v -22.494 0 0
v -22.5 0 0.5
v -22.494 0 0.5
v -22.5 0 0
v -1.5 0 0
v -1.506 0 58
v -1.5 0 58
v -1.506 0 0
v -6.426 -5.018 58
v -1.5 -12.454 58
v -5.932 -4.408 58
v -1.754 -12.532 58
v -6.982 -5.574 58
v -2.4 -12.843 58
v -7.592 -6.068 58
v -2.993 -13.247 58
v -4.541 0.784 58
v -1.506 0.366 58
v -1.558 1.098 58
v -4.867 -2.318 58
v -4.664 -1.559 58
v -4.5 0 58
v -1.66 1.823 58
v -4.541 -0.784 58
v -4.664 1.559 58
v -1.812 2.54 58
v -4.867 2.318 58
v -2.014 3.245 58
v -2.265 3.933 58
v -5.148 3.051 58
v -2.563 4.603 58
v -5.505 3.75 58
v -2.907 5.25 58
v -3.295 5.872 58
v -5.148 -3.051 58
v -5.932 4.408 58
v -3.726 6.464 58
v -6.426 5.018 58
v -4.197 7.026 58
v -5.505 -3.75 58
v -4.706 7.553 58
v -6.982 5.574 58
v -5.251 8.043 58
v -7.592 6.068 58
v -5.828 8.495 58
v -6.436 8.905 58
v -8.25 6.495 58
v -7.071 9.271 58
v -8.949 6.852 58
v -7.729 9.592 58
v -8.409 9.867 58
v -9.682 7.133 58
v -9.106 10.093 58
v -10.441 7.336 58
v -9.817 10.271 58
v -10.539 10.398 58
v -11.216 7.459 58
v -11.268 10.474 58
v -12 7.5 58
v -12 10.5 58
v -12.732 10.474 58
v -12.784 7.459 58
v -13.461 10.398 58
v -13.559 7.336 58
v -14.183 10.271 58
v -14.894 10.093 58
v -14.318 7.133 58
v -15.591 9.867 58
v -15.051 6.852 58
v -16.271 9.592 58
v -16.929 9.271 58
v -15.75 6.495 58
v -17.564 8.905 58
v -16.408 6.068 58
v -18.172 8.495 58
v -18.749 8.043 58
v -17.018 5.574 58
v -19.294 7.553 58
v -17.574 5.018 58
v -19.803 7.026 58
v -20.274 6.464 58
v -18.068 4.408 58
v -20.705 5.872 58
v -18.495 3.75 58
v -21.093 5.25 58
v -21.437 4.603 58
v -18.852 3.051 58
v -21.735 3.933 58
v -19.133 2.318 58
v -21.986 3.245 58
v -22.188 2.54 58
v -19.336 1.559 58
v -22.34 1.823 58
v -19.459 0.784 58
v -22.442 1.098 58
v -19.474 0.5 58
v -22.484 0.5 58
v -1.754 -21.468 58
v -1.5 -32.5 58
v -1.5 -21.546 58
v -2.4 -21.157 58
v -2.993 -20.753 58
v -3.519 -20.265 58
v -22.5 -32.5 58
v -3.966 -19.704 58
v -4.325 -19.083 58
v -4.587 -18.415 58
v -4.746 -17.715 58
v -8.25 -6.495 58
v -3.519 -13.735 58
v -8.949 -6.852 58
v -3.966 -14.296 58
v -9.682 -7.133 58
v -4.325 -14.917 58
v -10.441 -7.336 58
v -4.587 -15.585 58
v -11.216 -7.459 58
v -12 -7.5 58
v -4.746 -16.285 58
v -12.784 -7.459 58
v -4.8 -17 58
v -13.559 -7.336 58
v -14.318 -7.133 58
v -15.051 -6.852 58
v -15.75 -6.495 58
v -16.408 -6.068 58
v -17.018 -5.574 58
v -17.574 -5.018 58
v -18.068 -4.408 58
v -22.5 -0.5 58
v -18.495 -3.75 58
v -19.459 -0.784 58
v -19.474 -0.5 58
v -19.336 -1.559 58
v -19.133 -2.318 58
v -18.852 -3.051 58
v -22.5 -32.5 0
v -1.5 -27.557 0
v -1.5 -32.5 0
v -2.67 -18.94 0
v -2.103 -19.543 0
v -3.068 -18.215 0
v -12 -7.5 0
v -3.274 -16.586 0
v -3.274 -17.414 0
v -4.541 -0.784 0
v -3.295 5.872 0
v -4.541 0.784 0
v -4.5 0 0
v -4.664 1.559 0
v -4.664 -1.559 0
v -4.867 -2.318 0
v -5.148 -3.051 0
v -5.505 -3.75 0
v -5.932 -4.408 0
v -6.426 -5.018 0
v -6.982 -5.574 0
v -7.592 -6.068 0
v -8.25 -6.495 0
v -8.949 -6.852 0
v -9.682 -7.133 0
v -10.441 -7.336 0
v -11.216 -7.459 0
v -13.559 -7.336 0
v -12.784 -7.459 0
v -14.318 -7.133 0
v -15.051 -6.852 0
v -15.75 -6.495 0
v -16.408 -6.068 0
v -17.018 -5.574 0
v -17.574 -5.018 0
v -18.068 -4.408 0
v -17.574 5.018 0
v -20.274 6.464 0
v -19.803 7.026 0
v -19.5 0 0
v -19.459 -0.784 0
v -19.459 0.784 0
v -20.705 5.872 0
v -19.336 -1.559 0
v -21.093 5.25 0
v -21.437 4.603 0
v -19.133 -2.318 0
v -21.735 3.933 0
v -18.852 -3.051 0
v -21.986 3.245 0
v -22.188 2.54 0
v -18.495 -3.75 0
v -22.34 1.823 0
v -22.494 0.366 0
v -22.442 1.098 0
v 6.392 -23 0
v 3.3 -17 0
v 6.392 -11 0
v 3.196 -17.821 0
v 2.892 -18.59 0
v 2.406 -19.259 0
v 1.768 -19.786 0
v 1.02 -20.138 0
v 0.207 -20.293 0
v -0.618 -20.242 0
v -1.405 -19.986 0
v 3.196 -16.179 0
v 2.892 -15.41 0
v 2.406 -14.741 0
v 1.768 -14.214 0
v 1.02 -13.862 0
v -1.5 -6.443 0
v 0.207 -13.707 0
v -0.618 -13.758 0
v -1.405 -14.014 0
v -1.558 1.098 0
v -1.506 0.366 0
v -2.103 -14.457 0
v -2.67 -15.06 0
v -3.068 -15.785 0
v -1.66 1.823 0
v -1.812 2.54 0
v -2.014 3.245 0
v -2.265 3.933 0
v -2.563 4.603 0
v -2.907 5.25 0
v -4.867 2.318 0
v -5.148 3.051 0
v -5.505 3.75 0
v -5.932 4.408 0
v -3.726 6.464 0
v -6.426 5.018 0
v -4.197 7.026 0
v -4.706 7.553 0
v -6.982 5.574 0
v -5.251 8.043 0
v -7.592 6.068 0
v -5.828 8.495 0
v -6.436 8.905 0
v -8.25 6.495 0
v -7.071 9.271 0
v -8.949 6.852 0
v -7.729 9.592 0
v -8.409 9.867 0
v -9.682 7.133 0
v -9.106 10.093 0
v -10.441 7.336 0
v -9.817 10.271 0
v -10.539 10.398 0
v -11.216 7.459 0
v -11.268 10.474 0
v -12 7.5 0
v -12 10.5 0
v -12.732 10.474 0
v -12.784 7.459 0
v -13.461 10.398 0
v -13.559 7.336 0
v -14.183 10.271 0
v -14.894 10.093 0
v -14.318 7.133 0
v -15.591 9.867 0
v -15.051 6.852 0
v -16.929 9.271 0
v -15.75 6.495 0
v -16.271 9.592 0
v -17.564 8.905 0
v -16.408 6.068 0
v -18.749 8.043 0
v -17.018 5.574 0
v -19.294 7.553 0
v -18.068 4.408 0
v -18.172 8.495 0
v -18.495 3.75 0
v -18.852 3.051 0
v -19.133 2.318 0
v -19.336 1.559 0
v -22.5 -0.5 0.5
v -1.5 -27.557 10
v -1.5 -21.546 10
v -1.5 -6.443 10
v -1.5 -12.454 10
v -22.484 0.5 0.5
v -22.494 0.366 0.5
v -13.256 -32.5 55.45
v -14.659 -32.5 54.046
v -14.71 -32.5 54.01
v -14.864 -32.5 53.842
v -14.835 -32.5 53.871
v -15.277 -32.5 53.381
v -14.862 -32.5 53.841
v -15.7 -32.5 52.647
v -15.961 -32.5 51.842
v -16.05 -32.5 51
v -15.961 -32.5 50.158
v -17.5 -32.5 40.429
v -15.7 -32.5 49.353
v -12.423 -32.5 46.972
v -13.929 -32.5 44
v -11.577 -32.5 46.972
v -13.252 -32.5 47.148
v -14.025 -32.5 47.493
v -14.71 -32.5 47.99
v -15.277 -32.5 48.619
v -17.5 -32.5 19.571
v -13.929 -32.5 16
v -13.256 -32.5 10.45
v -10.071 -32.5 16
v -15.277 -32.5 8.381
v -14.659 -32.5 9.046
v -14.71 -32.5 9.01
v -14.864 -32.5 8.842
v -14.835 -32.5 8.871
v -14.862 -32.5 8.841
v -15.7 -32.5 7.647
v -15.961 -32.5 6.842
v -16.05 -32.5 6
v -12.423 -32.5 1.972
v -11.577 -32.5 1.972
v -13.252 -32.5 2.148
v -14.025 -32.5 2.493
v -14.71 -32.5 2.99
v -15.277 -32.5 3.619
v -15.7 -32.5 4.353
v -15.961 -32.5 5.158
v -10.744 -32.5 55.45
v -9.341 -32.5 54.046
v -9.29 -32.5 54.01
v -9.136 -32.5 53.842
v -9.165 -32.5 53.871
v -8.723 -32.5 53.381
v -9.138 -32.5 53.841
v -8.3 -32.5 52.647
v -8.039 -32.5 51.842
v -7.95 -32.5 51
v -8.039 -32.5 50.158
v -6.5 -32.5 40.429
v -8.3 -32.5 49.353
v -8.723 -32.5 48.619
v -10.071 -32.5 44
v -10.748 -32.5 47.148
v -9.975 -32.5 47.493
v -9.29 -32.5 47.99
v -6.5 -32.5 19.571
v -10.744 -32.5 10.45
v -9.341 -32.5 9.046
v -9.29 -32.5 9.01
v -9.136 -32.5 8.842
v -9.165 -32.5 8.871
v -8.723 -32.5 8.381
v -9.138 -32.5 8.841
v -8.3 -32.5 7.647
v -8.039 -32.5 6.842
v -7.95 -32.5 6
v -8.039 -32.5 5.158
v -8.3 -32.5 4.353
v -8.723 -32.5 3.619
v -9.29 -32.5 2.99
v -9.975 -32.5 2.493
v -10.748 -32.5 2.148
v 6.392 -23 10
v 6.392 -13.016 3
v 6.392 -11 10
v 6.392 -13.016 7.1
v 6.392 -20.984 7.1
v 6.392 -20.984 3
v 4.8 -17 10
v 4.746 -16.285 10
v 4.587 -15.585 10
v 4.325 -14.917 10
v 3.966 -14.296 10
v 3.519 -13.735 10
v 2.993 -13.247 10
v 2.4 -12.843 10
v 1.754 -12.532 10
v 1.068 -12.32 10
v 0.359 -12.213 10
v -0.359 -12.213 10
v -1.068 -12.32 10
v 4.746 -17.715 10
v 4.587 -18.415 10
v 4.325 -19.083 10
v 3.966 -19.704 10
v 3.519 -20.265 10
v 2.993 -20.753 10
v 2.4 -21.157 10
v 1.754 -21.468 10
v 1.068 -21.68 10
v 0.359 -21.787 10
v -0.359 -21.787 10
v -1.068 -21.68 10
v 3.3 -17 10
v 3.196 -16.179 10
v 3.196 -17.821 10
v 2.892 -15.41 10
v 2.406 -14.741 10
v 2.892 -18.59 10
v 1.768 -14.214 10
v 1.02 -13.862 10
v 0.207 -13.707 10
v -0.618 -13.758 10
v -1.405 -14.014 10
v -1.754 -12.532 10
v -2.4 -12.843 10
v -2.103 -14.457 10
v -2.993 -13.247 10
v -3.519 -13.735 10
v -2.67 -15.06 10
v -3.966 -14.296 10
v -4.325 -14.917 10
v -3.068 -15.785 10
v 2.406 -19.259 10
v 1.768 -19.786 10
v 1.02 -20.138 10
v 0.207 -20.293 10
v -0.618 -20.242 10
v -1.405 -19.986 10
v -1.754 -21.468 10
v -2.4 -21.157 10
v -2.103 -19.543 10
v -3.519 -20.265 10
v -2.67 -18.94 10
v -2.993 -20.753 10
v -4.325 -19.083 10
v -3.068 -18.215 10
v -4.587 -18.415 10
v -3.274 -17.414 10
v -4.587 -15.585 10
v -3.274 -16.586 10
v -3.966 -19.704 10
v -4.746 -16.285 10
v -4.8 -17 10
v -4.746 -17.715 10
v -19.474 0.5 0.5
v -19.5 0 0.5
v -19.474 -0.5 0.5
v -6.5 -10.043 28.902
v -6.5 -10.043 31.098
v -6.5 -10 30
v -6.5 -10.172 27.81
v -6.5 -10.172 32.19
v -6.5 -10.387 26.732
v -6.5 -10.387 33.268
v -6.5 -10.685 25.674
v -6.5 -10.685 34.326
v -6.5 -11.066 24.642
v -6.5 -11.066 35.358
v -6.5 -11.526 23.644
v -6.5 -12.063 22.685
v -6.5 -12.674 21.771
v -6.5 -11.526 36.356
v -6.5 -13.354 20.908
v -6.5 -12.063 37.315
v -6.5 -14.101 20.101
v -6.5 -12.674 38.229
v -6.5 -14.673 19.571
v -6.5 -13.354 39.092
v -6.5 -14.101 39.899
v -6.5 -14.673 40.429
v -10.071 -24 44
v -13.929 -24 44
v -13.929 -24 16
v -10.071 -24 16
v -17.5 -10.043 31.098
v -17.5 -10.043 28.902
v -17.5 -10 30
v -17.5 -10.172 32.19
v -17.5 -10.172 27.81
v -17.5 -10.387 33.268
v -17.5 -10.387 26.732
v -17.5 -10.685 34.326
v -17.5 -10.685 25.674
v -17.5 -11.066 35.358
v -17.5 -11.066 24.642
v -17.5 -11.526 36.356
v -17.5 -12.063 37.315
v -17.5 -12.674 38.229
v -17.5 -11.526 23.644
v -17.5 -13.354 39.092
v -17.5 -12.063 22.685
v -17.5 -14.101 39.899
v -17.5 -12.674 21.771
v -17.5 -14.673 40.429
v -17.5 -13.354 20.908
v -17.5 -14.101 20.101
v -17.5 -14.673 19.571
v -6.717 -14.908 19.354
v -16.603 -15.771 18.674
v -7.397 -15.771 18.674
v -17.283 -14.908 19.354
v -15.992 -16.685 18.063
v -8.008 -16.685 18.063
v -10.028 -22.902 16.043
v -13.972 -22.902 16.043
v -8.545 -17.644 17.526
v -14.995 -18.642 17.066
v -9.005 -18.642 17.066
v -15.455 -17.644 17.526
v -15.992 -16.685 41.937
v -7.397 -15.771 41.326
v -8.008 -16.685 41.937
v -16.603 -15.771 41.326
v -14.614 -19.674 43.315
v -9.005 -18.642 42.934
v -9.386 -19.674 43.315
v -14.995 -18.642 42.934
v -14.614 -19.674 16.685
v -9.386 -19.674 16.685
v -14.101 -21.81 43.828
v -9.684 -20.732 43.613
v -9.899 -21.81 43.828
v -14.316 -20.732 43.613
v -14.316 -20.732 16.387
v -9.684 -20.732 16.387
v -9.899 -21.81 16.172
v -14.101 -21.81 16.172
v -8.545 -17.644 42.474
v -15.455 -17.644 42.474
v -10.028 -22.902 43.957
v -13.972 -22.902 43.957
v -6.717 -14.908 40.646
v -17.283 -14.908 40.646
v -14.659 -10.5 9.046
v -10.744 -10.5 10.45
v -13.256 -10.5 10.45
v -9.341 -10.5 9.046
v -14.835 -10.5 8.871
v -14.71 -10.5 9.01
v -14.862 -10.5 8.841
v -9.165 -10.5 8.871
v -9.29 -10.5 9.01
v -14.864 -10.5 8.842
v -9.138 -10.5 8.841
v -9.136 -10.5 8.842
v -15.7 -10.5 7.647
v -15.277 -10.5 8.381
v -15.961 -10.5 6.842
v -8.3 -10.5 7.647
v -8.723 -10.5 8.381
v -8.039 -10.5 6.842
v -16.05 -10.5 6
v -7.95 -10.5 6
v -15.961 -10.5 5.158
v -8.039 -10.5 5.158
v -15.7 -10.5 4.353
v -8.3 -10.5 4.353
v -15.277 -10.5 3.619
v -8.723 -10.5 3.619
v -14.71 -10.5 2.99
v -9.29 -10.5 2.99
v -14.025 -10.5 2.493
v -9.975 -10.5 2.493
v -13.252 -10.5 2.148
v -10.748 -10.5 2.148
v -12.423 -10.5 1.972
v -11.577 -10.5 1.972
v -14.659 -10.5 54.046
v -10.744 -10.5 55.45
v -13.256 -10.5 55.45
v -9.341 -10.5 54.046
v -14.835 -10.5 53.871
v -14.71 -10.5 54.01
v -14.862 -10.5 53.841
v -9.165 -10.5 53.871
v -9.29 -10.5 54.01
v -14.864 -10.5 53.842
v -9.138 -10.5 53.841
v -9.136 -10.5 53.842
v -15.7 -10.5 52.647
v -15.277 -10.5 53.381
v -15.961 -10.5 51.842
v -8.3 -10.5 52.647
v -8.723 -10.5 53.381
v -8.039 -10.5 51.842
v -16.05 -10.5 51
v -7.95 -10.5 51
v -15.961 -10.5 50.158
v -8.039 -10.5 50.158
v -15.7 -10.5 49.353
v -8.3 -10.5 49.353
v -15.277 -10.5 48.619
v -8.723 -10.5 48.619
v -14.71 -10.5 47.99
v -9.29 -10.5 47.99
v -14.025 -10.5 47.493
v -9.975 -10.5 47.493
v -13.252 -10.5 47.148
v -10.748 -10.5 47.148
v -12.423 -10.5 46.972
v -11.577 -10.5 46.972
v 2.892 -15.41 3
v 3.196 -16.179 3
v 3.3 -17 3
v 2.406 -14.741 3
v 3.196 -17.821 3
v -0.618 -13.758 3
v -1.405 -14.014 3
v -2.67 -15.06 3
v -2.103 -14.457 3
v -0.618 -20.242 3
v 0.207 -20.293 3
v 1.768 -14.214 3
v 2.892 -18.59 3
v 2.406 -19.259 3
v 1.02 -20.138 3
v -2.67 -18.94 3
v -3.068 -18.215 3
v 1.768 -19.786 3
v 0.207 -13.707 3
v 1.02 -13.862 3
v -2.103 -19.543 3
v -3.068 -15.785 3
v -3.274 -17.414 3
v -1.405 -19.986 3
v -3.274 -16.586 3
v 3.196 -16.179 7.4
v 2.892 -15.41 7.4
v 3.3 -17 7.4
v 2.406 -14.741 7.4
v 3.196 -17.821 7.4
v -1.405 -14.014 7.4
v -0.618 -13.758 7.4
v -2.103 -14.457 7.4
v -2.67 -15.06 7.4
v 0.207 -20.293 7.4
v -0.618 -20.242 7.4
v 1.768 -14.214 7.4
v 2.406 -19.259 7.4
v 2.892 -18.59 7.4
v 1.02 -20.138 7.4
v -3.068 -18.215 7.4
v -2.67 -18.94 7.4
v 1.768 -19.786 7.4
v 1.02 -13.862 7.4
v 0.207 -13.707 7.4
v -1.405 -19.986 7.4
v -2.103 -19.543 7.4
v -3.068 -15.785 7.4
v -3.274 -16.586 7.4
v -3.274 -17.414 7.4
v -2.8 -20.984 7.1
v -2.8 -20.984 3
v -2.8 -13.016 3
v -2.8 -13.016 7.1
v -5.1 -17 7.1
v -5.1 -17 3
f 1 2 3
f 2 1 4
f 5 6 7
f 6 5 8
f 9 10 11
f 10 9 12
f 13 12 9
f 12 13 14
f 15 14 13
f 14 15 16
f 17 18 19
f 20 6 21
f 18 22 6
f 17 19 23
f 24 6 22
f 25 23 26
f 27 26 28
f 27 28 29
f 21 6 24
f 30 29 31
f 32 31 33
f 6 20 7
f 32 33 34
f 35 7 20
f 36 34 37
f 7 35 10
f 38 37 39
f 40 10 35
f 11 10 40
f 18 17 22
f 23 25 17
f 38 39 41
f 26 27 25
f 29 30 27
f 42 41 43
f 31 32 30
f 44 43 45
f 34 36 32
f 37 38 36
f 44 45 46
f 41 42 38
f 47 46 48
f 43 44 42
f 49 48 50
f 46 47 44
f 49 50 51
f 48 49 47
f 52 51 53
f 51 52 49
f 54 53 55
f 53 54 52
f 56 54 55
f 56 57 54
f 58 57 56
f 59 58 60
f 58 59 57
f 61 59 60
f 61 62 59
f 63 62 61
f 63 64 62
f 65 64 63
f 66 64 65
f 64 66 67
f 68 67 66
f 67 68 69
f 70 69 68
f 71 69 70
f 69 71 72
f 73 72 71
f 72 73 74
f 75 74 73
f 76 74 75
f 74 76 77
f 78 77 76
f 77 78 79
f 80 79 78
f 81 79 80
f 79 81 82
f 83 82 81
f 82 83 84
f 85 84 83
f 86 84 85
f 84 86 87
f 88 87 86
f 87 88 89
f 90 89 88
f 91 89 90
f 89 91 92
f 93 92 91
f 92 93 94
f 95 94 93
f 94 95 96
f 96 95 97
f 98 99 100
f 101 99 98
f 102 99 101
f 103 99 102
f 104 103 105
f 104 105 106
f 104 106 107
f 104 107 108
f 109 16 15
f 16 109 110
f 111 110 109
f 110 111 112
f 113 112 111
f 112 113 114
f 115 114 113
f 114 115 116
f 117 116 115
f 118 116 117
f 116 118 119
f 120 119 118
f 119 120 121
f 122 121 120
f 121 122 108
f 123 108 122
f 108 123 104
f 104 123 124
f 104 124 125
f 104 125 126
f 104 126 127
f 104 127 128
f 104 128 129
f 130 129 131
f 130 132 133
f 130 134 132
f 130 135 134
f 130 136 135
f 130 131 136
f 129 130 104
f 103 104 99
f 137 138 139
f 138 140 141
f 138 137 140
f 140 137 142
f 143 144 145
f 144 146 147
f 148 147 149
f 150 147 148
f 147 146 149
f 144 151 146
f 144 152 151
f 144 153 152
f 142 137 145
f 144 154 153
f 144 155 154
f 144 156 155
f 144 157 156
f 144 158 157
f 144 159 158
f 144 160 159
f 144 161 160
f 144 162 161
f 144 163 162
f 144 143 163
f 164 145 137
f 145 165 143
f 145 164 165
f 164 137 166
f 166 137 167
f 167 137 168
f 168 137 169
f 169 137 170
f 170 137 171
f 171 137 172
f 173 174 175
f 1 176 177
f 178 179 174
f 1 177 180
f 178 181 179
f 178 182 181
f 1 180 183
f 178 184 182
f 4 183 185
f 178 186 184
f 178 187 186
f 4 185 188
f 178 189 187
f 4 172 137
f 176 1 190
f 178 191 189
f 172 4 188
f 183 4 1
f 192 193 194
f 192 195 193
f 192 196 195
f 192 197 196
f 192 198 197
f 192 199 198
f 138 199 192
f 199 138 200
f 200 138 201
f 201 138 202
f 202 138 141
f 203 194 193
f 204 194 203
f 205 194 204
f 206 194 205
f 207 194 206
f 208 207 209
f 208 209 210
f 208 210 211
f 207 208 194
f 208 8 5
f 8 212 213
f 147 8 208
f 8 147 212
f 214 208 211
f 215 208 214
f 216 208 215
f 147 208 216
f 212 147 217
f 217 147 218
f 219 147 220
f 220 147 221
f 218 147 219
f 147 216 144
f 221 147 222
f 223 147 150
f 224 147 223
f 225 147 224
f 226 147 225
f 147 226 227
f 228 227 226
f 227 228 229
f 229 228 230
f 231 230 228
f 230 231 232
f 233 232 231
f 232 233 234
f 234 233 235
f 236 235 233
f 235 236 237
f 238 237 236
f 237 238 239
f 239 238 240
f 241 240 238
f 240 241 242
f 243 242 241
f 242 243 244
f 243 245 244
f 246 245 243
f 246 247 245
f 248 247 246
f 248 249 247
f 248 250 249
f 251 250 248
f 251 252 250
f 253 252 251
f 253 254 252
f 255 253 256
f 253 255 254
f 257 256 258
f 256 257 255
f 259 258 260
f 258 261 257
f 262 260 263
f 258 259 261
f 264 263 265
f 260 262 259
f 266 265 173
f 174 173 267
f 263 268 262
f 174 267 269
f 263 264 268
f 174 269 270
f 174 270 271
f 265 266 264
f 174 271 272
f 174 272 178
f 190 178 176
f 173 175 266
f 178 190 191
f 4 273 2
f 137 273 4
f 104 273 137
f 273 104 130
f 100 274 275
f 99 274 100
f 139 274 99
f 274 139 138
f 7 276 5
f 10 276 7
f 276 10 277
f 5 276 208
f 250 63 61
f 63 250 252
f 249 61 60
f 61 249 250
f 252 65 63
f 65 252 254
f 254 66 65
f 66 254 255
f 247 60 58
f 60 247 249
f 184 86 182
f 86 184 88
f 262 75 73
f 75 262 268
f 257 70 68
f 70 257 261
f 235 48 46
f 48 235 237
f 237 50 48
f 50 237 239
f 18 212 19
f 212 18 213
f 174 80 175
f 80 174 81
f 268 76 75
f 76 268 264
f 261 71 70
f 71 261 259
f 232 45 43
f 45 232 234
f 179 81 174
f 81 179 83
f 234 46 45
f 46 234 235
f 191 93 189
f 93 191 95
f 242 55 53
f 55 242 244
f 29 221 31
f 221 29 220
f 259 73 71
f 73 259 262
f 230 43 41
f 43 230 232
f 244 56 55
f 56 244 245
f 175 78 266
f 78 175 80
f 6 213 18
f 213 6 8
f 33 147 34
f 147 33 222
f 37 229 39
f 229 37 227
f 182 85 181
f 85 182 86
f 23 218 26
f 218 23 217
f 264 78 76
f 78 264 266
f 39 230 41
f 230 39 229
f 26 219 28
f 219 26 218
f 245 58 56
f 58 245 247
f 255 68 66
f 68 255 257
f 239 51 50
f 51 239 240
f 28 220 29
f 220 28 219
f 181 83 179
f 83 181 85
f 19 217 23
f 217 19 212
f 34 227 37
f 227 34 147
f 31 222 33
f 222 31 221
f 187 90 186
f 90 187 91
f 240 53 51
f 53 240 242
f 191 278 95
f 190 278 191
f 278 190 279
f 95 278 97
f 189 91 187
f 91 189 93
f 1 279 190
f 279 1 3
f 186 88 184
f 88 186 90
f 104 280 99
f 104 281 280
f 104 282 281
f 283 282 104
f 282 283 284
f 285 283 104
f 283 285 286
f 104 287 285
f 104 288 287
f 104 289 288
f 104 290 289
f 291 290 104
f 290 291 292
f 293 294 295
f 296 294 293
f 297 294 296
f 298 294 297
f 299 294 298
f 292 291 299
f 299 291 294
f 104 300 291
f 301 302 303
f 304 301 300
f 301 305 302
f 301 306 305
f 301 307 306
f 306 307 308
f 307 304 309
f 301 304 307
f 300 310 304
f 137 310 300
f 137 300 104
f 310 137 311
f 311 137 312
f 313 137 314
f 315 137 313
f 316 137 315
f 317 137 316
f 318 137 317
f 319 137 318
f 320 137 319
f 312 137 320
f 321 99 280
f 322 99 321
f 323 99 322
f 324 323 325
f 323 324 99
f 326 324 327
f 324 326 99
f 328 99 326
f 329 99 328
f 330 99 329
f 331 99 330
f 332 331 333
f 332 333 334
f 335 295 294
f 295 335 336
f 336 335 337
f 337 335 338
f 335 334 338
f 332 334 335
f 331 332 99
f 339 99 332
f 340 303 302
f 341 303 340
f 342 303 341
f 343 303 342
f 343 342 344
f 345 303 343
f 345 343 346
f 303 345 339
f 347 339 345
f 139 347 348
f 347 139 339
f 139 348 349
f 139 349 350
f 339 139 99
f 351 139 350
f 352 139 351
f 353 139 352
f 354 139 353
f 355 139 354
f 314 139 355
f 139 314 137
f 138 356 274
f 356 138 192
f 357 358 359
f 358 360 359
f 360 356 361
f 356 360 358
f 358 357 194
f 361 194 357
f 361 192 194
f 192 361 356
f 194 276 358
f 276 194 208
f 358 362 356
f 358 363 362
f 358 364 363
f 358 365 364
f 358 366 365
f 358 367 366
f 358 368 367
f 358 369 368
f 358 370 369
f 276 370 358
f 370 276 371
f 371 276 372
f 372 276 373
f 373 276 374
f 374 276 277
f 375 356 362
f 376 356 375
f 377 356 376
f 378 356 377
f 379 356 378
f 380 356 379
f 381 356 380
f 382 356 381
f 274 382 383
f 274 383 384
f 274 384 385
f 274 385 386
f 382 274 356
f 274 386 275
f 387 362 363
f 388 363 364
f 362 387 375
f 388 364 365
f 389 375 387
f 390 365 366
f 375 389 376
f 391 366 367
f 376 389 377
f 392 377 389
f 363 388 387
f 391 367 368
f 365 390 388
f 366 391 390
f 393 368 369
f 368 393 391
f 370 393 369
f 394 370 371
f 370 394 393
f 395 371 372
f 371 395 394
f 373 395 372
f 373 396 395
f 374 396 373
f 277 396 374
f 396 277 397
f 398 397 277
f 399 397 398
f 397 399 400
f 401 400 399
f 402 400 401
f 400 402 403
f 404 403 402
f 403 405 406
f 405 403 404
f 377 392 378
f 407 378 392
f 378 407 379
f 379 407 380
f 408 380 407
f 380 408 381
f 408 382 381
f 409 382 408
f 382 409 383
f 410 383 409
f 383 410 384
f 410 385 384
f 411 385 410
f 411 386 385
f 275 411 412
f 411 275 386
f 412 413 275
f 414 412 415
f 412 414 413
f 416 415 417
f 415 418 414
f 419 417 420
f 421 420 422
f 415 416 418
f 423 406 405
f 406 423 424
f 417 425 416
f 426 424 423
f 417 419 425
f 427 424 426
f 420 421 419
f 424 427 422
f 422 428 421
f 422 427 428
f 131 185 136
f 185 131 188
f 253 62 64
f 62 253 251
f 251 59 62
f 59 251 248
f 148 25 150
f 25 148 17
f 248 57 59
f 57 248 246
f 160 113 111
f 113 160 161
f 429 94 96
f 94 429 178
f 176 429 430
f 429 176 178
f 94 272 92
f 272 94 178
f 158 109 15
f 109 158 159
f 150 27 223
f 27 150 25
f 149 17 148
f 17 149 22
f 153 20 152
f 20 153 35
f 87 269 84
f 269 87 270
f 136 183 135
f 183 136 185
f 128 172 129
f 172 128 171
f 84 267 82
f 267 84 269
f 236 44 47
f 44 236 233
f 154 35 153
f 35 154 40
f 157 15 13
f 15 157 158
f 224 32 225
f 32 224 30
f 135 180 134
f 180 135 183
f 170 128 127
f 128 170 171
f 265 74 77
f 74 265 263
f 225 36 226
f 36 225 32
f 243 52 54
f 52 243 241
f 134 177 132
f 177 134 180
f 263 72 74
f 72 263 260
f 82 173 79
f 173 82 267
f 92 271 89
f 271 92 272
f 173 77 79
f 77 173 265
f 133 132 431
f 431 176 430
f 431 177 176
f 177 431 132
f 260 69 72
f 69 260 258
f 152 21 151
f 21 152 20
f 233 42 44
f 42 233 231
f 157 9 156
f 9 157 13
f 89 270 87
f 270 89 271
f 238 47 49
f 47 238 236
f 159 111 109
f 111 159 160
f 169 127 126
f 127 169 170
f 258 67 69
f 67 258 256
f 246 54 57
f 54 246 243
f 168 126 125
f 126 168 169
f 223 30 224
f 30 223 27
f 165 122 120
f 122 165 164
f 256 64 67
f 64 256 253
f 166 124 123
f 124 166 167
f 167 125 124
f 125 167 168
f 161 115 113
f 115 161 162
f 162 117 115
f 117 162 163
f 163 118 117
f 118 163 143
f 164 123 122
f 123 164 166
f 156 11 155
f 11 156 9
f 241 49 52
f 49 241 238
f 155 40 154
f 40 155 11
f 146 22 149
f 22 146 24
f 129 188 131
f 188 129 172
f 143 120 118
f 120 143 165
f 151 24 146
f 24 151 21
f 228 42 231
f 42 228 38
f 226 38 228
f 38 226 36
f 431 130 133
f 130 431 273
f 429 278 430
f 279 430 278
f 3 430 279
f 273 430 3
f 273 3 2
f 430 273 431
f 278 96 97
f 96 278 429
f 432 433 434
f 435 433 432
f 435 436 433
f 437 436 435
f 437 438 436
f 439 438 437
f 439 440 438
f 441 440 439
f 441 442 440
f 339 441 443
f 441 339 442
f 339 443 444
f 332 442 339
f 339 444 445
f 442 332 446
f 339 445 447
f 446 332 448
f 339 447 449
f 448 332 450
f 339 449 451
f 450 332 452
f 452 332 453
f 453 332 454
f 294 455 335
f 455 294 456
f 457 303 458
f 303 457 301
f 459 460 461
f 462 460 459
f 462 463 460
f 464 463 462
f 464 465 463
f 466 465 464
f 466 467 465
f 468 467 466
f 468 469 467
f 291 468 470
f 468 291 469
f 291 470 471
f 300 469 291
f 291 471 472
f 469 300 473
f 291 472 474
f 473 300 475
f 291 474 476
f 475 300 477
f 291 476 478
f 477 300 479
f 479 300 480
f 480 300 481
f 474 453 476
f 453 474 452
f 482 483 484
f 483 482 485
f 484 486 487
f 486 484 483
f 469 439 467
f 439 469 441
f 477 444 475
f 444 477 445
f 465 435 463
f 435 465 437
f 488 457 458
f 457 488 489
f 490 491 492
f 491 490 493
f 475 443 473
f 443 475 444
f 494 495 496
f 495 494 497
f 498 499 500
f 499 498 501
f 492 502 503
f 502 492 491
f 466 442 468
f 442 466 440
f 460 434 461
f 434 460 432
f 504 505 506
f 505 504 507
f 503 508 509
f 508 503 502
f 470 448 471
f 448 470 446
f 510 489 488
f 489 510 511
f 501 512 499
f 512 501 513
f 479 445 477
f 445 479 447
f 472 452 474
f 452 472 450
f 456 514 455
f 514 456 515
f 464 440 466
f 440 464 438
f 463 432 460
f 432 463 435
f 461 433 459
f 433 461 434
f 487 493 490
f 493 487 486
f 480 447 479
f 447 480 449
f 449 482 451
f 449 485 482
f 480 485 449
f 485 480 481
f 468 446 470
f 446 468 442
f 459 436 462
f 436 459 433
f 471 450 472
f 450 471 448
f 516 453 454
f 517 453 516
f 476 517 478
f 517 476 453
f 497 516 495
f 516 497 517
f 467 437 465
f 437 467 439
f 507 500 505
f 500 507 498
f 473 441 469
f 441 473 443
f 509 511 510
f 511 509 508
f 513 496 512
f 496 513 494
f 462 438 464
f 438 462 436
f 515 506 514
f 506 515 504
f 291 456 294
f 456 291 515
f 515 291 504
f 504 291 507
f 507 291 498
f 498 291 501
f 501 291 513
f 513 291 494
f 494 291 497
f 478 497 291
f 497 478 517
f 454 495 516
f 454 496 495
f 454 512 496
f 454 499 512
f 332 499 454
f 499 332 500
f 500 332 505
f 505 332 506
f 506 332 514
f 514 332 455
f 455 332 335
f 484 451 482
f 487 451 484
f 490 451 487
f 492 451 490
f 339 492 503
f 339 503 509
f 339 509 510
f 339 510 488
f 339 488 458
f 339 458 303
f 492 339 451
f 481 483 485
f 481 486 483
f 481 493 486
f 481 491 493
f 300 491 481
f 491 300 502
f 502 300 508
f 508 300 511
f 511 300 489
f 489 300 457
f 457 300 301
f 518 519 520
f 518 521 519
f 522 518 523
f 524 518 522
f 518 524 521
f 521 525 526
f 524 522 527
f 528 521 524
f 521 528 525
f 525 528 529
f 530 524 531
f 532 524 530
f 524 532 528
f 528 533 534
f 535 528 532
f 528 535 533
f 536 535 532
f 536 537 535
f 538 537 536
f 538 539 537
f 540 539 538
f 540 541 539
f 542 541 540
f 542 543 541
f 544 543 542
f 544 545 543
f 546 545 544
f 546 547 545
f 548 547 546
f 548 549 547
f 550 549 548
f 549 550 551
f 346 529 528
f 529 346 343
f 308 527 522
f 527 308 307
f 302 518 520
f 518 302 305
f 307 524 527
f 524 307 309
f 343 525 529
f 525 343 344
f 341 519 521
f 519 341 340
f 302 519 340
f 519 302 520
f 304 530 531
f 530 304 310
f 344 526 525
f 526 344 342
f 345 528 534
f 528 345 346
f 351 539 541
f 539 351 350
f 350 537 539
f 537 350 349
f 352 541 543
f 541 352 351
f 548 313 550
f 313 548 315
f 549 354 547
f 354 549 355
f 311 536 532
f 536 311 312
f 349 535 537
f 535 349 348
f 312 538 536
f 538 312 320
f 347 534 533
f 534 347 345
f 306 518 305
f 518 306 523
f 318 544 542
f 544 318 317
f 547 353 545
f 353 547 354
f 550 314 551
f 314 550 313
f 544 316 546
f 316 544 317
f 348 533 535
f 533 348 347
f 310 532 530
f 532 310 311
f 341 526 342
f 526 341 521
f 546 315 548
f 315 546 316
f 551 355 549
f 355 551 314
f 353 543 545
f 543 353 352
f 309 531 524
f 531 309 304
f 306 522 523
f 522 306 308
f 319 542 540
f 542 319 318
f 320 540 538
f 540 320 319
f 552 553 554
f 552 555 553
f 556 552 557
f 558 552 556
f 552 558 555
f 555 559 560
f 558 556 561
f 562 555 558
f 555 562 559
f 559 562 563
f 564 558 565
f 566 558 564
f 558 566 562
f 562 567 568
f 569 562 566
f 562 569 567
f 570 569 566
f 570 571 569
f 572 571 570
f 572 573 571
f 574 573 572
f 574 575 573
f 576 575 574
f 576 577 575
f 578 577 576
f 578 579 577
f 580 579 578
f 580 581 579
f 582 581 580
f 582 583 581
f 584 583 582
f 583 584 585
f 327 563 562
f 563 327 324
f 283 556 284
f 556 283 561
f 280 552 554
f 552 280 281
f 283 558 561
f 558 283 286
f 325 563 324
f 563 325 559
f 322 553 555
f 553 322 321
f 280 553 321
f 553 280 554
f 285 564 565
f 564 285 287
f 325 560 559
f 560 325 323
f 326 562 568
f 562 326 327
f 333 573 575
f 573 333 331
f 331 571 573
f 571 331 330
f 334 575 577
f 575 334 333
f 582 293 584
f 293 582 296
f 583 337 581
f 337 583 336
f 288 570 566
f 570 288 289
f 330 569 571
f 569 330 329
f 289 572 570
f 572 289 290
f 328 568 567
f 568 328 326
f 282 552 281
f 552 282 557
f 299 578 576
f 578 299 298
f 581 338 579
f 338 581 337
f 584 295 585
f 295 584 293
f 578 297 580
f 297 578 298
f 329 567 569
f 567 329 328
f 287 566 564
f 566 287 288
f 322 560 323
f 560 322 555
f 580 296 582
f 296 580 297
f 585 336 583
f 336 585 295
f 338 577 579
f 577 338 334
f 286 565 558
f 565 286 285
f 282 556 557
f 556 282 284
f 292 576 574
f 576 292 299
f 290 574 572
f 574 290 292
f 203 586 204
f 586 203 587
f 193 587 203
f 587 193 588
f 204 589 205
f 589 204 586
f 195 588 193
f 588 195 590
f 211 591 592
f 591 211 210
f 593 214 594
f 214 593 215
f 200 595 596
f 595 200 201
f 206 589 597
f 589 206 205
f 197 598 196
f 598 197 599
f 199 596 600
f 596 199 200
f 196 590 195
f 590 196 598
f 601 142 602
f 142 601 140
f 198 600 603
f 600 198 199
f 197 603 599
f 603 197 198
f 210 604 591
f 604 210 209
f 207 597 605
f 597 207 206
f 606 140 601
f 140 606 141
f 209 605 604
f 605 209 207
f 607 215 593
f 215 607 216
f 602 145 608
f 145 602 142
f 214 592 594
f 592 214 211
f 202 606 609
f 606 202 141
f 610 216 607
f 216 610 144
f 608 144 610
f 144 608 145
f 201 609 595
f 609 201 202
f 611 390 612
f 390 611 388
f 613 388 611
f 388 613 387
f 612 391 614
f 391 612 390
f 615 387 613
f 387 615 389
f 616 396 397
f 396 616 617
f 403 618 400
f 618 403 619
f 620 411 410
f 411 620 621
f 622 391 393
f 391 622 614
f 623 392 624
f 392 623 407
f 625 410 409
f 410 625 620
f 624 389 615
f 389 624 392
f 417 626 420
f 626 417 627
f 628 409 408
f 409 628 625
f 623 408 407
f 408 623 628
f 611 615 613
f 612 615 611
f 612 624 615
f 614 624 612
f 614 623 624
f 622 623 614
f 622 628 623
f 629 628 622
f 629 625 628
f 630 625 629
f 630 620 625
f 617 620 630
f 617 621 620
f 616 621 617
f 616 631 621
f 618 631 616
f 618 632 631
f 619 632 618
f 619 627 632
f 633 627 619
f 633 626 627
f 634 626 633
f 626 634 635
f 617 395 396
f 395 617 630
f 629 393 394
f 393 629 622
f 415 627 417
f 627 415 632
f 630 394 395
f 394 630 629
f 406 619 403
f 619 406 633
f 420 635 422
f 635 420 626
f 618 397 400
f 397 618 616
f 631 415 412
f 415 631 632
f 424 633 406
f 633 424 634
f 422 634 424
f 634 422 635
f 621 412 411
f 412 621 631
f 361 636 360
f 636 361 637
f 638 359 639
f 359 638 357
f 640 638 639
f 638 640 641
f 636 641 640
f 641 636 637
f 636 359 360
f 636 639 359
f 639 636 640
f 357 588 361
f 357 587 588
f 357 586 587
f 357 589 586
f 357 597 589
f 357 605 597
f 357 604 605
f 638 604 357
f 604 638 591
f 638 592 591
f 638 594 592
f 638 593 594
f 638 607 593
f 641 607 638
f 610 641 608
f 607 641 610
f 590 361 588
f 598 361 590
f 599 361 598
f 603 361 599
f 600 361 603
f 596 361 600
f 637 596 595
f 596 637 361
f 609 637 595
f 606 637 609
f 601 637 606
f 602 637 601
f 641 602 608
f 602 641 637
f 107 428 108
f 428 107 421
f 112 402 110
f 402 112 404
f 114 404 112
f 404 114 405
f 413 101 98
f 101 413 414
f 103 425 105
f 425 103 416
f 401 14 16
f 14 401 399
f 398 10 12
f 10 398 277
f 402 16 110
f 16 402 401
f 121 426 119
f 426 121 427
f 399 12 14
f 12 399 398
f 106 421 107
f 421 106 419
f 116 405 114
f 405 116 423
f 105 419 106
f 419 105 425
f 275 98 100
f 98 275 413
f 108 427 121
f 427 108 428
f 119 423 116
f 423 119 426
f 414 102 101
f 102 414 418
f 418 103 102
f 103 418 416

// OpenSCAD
// file: bearing.scad
// PRUSA iteration3
// Bearing holders
// GNU GPL v3
// Josef Průša <iam@josefprusa.cz> and contributors
// http://www.reprap.org/wiki/Prusa_Mendel
// http://prusamendel.org

bearing_diameter = 15;

module horizontal_bearing_base(bearings=1){
 translate(v=[0,0,6]) cube(size = [24,4+bearings*24,12], center = true);	
}
module horizontal_bearing_holes(bearings=1){
 cutter_lenght = 10+bearings*25;
 one_holder_lenght = 8+25;
 holder_lenght = 8+bearings*25;
 
 // Main bearing cut
 difference(){
  translate(v=[0,0,12+1.5]) rotate(a=[90,0,0]) translate(v=[0,0,-cutter_lenght/2]) cylinder(h = cutter_lenght, r=bearing_diameter/2, $fn=50);
  // Bearing retainers
  translate(v=[0,1.5-holder_lenght/2,3+1.5]) cube(size = [24,6,8], center = true);
  translate(v=[0,-1.5+holder_lenght/2,3+1.5]) cube(size = [24,6,8], center = true);
 }
 
 // Ziptie cutouts
 ziptie_cut_ofset = 0;
 for ( i = [0 : bearings-1] ){
  // For easier positioning I move them by half of one 
  // bearing holder then add each bearign lenght and then center again
  translate(v=[0,-holder_lenght/2,0]) translate(v=[0,one_holder_lenght/2+i*25,0]) difference(){
   union(){
    translate(v=[0,2-6,12]) rotate(a=[90,0,0]) translate(v=[0,0,0]) cylinder(h = 4, r=12.5, $fn=50);
    translate(v=[0,2+6,12]) rotate(a=[90,0,0]) translate(v=[0,0,0]) cylinder(h = 4, r=12.5, $fn=50);
   }
   translate(v=[0,10,12]) rotate(a=[90,0,0]) translate(v=[0,0,0]) cylinder(h = 24, r=10, $fn=50);
  }
 }
 
}

module horizontal_bearing_test(){
 difference(){
  horizontal_bearing_base(1);
  horizontal_bearing_holes(1);
 }
 translate(v=[30,0,0]) difference(){
  horizontal_bearing_base(2);
  horizontal_bearing_holes(2);
 }
 translate(v=[60,0,0]) difference(){
  horizontal_bearing_base(3);
  horizontal_bearing_holes(3);
 }
}



thinwall = 3;
bearing_size = bearing_diameter + 2 * thinwall;

module vertical_bearing_base(){
 translate(v=[-2-bearing_size/4,0,29]) cube(size = [4+bearing_size/2,bearing_size,58], center = true);
 cylinder(h = 58, r=bearing_size/2, $fn = 90);
}

module vertical_bearing_holes(){
  translate(v=[0,0,-1]) cylinder(h = 62, r=bearing_diameter/2, $fn = 60);
  rotate(a=[0,0,90]) translate(v=[8,0,31.5]) cube(size = [5,1,62], center = true);
}

difference(){
vertical_bearing_base();
vertical_bearing_holes();
}
// main file
// PRUSA iteration3
// X end prototype
// GNU GPL v3
// Josef Průša <iam@josefprusa.cz> and contributors
// http://www.reprap.org/wiki/Prusa_Mendel
// http://prusamendel.org



use <bearing.scad>
rod_distance = 45;

bearing_diameter = 15;
thinwall = 3;
bearing_size = bearing_diameter + 2 * thinwall;

height = 58;
width = 21;

nut_classic = 0;

module x_end_base(){
  // Hlavni blok
  translate([-12,-20,height/2]) cube([width,25,height], center = true);	
  // Drzak loziska
  translate([-12,0,0]) rotate([0,0,90]) vertical_bearing_base();
  // Hexagon
  if(nut_classic){
    // Osmihran
    translate(v=[-4,-17,0]) rotate([0,0,30]) cylinder(h = 3+5, r=12, $fn = 6);    
  } else{   
    translate(v=[-4,-17,0]) rotate([0,0,30]) cylinder(h = 3+4+3, r=12, $fn = 6);
  }
  }

module x_end_holes(){
  translate([-12,0,0]) rotate([0,0,90]) vertical_bearing_holes();
  // Vyrez pro remen
  translate([2,0,0]){
  difference(){
	difference(){
	  union(){
        translate([-5.5-10+1.5,-34,30]) cube(size = [11,20,28], center = true);
	    translate([-5.5-10+1.5,-24,30]) rotate([0,90,0]) cylinder(r=14,h=11,$fn=80,center=true);
	  }	
	}  
	// Nice edges
	translate([-5.5-10+1.5,-10,30+23]) rotate([0,45,0]) cube(size = [10,46,28], center = true);
	translate([-5.5-10+1.5,-10,30+23]) rotate([0,-45,0]) cube(size = [10,46,28], center = true);
	translate([-5.5-10+1.5,-10,30-23]) rotate([0,45,0]) cube(size = [10,46,28], center = true);
	translate([-5.5-10+1.5,-10,30-23]) rotate([0,-45,0]) cube(size = [10,46,28], center = true);
  }
}

  // Bottom pushfit rod
  translate([-12,-41.5,6]) rotate(a=[-90,0,0]) pushfit_rod(8.1,31);
  // Top pushfit rod
  translate([-12,-41.5,rod_distance+6]) rotate(a=[-90,0,0]) pushfit_rod(8.1,31);
  if(nut_classic){
    // Klasicky zapustena matka
    translate(v=[0,-17,-0.5]) cylinder(h = 4, r=3, $fn=25);
    translate(v=[0,-17,3]) rotate([0,0,30]) cylinder(h = 10, r=4.5, $fn = 6);
    // Rezerva pro pruznou spojku
    translate([0,-17,3+5]) cylinder(h = height, r=4.8, $fn=42);
  } else {
    // Otvor na matku
    translate([0,-17,-0.1]) cylinder(h = 4, r=3.3, $fn=25);
    translate([0,-17,3+4.1+0.3]) cylinder(h = 4, r=3.3, $fn=25);
    translate([-0.5,-17,3]) rotate([0,0,0]) cylinder(h = 4.1, r=4.6, $fn = 6);
    translate([0,-17-cos(30)*4.6,3]) cube([10,2*cos(30)*4.6,4.1]);
    // Rezerva pro pruznou spojku
    translate([0,-17,3+4+3]) cylinder(h = height, r=4.8, $fn=42);    
  }    
}


// Final prototype
module x_end_plain(){
 difference(){
  x_end_base();
  x_end_holes();
 }
}

x_end_plain();

module pushfit_rod(diameter,length){
 cylinder(h = length, r=diameter/2, $fn=30);
 difference(){
 	translate([0,-diameter/2.85,length/2]) rotate([0,0,45]) cube(size = [diameter/2,diameter/2,length], center = true);
 	translate([0,-diameter/4-diameter/2-0.4,length/2]) rotate([0,0,0]) cube(size = [diameter,diameter/2,length], center = true);
 }
 //translate(v=[0,-diameter/2-2,length/2]) cube(size = [diameter,1,length], center = true);
}
